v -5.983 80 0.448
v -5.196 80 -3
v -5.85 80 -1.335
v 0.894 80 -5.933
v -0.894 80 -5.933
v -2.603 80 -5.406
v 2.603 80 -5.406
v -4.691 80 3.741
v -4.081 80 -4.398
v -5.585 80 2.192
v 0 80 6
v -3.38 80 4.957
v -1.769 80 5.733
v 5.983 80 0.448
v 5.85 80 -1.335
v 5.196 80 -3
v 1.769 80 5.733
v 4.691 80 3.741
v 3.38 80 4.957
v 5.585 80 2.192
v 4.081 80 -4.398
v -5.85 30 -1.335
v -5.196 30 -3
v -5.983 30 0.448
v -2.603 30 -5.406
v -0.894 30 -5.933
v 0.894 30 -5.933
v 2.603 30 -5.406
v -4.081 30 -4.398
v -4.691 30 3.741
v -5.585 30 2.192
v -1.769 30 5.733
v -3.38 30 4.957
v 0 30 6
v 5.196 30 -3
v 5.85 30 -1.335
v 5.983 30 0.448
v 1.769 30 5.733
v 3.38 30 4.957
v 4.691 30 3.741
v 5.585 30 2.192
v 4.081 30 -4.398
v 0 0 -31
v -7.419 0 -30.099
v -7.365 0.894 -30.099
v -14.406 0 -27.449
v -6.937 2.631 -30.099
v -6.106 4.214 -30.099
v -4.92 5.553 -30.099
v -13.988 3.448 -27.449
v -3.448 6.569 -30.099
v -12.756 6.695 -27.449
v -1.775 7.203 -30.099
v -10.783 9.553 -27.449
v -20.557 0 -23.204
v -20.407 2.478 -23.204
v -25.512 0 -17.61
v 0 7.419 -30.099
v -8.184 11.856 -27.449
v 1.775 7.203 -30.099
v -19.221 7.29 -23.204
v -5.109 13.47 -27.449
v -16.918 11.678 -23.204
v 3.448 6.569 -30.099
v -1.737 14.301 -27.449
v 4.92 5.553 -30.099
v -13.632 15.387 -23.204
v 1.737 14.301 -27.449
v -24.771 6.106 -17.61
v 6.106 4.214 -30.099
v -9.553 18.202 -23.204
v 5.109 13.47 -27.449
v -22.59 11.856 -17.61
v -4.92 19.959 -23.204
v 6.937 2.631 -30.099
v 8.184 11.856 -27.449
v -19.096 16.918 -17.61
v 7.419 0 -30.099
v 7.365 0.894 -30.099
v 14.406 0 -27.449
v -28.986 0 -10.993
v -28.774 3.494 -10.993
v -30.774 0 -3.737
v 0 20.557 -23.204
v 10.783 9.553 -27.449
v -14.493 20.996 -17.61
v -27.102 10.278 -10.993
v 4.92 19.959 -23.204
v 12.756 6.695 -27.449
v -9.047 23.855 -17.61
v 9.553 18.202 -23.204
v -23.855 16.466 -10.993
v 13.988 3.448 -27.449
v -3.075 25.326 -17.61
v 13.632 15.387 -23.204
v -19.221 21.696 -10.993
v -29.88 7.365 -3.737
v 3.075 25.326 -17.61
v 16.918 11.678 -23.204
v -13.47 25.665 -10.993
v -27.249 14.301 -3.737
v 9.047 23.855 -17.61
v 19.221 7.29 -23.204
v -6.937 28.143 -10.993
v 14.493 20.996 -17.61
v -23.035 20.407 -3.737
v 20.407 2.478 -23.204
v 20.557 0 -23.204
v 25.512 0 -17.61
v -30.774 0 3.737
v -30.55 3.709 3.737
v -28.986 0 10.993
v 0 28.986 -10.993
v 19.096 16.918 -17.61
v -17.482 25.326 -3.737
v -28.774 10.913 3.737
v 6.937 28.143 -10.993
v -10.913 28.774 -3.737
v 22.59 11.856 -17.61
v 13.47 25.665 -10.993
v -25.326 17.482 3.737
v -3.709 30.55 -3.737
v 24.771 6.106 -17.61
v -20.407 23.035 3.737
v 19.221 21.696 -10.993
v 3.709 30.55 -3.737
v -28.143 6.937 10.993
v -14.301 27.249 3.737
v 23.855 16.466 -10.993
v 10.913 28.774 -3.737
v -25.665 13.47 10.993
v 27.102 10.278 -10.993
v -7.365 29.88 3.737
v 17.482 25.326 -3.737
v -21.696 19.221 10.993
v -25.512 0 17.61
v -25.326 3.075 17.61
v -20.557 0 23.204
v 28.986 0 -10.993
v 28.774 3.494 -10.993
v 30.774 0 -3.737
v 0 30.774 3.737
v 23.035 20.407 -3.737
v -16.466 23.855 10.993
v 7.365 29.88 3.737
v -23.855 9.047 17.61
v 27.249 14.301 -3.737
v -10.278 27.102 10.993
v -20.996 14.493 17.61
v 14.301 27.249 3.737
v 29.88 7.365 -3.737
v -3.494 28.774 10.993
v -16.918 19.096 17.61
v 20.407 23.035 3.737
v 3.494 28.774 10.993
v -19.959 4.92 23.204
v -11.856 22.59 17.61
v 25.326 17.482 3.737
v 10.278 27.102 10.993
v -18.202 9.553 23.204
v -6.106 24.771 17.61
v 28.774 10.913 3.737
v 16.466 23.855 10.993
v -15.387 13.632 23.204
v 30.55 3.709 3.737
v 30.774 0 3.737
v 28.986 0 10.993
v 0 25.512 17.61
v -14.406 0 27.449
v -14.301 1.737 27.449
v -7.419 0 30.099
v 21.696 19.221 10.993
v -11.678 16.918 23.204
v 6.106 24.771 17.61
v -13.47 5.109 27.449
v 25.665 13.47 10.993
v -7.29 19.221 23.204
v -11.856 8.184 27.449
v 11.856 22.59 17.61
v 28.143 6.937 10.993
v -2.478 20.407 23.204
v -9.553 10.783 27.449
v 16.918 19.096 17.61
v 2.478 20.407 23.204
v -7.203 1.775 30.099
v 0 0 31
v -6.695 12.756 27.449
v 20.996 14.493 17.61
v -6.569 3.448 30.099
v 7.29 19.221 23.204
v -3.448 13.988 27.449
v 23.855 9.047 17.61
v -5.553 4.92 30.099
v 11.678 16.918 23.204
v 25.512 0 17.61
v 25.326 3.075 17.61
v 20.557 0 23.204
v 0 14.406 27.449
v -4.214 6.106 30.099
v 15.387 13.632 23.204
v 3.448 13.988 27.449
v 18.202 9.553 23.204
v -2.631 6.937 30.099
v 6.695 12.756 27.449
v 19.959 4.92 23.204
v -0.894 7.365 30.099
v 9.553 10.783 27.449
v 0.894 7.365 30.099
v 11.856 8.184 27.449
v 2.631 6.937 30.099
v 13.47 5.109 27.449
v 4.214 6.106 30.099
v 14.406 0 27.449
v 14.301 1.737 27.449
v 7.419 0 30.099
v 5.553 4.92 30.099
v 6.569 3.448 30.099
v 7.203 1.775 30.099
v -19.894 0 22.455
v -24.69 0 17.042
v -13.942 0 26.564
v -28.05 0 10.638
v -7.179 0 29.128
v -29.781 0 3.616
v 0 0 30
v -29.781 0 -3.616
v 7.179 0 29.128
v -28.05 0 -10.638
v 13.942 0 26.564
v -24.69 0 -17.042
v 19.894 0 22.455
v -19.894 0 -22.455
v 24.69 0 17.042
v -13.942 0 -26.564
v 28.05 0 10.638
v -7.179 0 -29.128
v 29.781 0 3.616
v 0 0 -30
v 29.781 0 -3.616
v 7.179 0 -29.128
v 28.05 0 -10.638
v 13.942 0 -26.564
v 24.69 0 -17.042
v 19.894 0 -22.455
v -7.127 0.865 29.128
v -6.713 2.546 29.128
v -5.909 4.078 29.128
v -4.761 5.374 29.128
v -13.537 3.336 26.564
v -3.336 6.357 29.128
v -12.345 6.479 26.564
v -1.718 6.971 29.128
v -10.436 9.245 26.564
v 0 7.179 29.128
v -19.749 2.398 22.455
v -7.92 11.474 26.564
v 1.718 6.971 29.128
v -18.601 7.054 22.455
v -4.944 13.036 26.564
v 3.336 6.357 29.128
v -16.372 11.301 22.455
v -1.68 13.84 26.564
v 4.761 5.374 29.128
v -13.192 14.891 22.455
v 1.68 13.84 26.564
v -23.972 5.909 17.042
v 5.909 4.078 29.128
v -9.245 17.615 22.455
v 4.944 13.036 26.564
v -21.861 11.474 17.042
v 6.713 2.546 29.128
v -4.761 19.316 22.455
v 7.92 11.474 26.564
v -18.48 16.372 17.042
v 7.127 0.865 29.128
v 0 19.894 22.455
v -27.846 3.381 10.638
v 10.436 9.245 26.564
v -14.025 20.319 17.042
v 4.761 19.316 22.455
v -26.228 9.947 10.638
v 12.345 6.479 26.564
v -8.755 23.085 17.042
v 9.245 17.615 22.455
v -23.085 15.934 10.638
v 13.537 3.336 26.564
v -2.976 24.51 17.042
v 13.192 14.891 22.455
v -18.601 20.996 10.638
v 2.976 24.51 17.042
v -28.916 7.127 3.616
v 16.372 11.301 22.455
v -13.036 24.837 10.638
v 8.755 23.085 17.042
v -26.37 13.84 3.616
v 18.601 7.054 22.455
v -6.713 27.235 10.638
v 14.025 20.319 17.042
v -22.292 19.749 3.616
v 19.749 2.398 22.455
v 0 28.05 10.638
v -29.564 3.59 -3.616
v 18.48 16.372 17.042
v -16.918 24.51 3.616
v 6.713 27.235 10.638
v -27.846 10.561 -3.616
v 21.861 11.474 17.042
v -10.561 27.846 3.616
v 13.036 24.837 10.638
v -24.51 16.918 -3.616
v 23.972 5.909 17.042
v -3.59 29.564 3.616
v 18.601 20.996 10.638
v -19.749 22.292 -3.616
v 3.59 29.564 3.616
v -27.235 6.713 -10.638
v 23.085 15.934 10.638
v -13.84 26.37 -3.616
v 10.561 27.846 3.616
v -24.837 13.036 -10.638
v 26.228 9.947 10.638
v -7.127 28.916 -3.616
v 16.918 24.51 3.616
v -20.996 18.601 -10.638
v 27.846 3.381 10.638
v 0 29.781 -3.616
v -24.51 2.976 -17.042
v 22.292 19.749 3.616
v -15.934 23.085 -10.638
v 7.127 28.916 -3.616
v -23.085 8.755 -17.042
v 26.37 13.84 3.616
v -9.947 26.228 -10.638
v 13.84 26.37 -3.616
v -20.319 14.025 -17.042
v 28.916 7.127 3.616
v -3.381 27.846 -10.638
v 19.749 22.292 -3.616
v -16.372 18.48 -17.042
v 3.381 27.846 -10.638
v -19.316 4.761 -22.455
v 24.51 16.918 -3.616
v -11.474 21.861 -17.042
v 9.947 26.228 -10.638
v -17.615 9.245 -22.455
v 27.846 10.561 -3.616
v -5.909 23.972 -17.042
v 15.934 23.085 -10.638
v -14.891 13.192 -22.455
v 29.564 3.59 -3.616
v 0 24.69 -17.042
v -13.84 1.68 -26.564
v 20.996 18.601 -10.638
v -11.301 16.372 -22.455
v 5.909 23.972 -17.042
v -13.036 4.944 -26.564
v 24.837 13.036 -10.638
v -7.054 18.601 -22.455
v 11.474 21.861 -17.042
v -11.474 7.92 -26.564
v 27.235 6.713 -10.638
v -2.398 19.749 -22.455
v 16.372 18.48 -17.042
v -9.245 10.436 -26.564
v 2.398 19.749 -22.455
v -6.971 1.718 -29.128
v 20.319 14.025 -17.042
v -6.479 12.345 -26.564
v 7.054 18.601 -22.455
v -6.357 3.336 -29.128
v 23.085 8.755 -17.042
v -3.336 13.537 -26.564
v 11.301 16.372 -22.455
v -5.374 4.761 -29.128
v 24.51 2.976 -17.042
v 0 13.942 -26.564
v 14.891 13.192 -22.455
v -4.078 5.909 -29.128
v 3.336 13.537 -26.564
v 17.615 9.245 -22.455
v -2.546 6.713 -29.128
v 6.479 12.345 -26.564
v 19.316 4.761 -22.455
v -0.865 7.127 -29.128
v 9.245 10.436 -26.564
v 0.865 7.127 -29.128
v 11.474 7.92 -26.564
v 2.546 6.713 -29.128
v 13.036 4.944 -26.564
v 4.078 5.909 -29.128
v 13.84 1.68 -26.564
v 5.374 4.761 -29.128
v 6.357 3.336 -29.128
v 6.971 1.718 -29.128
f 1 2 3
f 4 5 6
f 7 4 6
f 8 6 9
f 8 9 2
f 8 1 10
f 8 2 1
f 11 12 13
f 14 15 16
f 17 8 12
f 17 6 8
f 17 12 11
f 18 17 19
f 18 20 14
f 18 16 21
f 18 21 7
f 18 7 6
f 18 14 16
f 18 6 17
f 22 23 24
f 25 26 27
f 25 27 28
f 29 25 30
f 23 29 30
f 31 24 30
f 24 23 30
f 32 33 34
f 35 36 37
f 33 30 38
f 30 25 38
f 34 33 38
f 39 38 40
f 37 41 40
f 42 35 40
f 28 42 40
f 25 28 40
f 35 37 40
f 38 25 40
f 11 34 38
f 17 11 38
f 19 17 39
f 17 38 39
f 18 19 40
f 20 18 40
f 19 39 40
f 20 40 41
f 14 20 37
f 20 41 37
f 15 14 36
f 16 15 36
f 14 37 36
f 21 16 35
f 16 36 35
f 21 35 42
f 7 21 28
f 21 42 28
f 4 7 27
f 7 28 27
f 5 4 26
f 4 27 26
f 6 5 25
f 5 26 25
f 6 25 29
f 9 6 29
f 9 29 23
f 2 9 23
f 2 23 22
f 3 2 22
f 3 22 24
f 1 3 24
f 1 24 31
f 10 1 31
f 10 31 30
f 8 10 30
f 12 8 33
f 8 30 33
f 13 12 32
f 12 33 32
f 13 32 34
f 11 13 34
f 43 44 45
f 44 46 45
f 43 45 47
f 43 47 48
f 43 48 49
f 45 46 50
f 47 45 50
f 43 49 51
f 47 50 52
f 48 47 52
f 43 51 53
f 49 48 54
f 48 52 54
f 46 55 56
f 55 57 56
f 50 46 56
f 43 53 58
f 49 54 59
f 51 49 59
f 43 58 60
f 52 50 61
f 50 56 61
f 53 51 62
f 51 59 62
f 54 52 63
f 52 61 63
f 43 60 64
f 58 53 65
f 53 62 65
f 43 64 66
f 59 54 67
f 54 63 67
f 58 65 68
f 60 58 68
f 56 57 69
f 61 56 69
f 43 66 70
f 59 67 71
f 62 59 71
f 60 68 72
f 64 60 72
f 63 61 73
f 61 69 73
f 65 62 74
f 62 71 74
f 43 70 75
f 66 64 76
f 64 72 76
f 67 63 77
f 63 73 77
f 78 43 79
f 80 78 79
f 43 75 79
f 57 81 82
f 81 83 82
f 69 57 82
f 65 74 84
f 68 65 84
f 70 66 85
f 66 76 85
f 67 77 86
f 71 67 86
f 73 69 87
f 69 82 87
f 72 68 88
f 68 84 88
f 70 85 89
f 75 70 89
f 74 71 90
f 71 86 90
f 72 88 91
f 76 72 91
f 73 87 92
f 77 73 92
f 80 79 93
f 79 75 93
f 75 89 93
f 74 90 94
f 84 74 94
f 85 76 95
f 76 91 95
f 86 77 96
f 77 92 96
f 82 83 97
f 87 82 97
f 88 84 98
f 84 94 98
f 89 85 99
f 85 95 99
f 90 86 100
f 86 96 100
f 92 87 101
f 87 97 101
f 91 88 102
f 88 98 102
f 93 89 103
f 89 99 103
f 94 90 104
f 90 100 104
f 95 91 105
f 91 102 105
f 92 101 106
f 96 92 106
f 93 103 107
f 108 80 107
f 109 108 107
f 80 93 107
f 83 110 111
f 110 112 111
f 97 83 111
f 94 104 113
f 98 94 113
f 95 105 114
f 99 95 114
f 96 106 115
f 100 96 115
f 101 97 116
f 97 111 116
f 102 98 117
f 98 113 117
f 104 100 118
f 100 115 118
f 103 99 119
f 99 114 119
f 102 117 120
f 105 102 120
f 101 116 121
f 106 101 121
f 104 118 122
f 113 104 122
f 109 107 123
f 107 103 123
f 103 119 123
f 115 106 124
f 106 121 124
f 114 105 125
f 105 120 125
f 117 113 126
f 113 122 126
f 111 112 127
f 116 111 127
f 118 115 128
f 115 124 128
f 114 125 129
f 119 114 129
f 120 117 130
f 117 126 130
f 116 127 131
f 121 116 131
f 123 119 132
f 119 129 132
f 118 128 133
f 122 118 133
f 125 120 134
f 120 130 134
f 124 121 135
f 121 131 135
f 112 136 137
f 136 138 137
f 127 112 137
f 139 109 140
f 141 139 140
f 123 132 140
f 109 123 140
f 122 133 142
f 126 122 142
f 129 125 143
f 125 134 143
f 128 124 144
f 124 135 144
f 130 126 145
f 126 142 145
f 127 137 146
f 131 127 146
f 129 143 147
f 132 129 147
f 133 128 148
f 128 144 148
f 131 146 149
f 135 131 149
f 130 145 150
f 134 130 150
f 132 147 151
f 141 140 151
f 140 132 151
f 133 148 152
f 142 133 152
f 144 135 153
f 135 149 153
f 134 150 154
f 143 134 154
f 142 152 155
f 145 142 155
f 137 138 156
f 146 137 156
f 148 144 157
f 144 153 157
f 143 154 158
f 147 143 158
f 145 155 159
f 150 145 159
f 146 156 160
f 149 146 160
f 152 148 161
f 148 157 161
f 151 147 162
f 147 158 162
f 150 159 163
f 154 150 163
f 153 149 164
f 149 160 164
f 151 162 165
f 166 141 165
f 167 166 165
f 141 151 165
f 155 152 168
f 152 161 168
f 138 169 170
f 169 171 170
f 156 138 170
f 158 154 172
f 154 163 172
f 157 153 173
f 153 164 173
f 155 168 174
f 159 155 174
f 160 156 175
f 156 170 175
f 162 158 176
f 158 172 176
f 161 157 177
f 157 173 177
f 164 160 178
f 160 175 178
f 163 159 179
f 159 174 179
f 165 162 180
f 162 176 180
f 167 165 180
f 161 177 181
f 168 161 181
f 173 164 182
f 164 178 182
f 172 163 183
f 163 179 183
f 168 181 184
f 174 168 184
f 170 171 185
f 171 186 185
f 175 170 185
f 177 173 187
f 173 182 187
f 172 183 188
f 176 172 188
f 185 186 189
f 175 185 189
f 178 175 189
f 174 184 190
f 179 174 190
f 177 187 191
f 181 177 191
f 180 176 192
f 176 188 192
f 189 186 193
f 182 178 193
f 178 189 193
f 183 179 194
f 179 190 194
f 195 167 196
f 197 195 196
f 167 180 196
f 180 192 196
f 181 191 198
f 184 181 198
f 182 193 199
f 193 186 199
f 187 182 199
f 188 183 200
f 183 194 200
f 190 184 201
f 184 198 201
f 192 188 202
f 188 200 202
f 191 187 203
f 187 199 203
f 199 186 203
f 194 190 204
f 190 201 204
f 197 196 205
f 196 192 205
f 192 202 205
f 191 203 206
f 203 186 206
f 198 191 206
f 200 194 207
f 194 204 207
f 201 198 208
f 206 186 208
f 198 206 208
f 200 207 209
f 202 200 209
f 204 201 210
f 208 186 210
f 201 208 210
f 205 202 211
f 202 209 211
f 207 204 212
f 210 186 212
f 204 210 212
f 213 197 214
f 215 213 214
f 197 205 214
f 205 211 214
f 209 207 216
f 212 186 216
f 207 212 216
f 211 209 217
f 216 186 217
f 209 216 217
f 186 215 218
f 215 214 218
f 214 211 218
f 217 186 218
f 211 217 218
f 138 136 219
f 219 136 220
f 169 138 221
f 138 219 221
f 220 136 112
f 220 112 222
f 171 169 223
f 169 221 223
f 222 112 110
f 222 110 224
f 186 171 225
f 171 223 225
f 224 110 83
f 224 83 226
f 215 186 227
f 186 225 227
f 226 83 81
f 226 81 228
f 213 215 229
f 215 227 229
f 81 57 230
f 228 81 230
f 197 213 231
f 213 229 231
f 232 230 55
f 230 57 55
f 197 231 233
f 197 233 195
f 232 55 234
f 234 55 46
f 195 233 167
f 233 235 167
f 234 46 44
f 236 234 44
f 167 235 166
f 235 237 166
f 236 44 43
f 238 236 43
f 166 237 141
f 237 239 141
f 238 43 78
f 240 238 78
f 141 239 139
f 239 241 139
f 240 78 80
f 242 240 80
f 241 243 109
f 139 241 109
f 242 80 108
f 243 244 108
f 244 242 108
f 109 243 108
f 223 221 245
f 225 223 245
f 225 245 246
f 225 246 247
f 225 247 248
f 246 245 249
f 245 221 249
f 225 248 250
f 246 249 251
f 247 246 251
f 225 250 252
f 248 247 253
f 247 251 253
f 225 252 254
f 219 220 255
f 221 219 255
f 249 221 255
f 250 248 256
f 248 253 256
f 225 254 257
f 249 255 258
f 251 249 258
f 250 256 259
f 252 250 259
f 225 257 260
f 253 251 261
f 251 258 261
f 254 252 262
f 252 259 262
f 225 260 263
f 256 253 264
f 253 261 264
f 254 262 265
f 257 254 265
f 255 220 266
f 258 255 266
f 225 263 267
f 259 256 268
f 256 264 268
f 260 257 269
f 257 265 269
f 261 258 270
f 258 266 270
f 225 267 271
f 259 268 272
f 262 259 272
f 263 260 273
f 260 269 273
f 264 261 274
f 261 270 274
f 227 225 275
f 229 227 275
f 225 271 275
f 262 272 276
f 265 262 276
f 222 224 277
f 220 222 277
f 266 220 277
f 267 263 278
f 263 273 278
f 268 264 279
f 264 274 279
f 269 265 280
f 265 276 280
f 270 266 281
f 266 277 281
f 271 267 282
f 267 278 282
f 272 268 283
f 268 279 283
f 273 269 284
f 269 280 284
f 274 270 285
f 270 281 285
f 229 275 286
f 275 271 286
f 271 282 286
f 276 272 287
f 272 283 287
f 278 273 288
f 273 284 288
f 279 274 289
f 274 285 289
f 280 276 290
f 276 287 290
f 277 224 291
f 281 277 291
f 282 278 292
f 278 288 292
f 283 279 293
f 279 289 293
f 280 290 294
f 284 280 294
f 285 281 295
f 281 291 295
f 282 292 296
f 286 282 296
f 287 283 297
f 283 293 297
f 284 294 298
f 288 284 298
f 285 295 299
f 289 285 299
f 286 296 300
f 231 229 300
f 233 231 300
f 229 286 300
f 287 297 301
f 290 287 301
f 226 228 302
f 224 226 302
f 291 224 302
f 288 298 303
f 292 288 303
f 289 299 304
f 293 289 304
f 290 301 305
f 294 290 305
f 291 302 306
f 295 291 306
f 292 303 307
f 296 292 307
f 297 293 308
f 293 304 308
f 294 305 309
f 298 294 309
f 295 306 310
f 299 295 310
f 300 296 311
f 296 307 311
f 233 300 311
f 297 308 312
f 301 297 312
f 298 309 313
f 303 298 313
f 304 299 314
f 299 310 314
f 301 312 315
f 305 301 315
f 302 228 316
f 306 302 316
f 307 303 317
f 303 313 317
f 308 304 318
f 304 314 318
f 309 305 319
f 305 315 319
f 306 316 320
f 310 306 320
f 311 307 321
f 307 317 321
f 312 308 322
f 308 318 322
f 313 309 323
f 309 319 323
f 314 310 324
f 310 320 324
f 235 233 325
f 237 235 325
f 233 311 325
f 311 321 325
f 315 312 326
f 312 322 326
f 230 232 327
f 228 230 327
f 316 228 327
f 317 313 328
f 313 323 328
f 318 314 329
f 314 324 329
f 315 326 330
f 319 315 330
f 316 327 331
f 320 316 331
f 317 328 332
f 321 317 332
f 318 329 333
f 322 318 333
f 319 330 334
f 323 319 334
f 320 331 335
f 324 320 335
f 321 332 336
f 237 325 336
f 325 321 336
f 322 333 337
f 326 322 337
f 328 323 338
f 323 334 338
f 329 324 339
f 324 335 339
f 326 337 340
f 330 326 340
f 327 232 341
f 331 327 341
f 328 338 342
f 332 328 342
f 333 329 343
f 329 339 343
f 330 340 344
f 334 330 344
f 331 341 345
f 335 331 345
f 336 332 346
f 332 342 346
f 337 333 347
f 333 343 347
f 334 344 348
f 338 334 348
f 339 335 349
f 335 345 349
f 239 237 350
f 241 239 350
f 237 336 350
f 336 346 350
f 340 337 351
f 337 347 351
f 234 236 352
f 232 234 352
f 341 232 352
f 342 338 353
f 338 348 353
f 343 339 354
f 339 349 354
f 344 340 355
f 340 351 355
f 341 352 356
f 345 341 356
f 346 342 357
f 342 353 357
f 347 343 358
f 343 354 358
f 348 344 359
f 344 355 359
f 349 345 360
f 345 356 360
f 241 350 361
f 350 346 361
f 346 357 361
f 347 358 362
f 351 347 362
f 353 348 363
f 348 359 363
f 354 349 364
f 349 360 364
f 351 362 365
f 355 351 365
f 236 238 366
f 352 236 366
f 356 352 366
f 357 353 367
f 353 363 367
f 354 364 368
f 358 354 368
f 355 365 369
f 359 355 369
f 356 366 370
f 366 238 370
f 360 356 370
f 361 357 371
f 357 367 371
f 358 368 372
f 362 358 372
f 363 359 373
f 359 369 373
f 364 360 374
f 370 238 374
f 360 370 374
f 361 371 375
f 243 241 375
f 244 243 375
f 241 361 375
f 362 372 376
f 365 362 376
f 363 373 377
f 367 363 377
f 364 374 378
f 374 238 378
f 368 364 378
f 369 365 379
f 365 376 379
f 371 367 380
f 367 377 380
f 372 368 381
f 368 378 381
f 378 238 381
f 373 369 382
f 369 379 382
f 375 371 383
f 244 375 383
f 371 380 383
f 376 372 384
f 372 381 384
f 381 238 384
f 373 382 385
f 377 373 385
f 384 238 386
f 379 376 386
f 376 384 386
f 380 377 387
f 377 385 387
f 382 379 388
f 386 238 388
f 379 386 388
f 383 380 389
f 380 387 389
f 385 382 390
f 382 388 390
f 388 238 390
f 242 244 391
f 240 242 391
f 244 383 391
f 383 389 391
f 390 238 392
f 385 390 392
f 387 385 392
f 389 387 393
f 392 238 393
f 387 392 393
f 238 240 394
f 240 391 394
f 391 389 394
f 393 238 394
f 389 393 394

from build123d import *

# Parameters (mm, degrees)
SKETCH4_R           = 31
CUT_EXTRUDE1_DEPTH  = 50
SKETCH6_R           = 6
BOSS_EXTRUDE1_DEPTH = 50


with BuildPart() as part:
    # Sketch2 → Revolve-Thin1 (revolve)
    with BuildSketch(Plane(origin=(0, 0, 0), x_dir=(1, 0, 0), z_dir=(0, 1, 0))):
        with BuildLine():
            ThreePointArc((0, -30), (30, 0), (0, 30))
            Line((0, 30), (0, 31))
            ThreePointArc((0, 31), (31, 0), (0, -31))
            Line((0, -31), (0, -30))
        make_face()
    revolve(axis=Axis((0, 0, 40.153207951), (0, 0, -1)))

    # Sketch4 → Cut-Extrude1 (cut)
    with BuildSketch(Plane(origin=(0, 0, 0), x_dir=(1, 0, 0), z_dir=(0, 1, 0))):
        Circle(SKETCH4_R)
    extrude(amount=-CUT_EXTRUDE1_DEPTH, mode=Mode.SUBTRACT)


with BuildPart() as body_2:
    # Sketch6 → Boss-Extrude1 (new body)
    with BuildSketch(Plane(origin=(0, 30, 0), x_dir=(1, 0, 0), z_dir=(0, 1, 0))):
        with Locations(Location((0, 0, 0), (0, 0, 270))):
            Circle(SKETCH6_R)
    extrude(amount=BOSS_EXTRUDE1_DEPTH)


solid = Compound([part.part, body_2.part])
